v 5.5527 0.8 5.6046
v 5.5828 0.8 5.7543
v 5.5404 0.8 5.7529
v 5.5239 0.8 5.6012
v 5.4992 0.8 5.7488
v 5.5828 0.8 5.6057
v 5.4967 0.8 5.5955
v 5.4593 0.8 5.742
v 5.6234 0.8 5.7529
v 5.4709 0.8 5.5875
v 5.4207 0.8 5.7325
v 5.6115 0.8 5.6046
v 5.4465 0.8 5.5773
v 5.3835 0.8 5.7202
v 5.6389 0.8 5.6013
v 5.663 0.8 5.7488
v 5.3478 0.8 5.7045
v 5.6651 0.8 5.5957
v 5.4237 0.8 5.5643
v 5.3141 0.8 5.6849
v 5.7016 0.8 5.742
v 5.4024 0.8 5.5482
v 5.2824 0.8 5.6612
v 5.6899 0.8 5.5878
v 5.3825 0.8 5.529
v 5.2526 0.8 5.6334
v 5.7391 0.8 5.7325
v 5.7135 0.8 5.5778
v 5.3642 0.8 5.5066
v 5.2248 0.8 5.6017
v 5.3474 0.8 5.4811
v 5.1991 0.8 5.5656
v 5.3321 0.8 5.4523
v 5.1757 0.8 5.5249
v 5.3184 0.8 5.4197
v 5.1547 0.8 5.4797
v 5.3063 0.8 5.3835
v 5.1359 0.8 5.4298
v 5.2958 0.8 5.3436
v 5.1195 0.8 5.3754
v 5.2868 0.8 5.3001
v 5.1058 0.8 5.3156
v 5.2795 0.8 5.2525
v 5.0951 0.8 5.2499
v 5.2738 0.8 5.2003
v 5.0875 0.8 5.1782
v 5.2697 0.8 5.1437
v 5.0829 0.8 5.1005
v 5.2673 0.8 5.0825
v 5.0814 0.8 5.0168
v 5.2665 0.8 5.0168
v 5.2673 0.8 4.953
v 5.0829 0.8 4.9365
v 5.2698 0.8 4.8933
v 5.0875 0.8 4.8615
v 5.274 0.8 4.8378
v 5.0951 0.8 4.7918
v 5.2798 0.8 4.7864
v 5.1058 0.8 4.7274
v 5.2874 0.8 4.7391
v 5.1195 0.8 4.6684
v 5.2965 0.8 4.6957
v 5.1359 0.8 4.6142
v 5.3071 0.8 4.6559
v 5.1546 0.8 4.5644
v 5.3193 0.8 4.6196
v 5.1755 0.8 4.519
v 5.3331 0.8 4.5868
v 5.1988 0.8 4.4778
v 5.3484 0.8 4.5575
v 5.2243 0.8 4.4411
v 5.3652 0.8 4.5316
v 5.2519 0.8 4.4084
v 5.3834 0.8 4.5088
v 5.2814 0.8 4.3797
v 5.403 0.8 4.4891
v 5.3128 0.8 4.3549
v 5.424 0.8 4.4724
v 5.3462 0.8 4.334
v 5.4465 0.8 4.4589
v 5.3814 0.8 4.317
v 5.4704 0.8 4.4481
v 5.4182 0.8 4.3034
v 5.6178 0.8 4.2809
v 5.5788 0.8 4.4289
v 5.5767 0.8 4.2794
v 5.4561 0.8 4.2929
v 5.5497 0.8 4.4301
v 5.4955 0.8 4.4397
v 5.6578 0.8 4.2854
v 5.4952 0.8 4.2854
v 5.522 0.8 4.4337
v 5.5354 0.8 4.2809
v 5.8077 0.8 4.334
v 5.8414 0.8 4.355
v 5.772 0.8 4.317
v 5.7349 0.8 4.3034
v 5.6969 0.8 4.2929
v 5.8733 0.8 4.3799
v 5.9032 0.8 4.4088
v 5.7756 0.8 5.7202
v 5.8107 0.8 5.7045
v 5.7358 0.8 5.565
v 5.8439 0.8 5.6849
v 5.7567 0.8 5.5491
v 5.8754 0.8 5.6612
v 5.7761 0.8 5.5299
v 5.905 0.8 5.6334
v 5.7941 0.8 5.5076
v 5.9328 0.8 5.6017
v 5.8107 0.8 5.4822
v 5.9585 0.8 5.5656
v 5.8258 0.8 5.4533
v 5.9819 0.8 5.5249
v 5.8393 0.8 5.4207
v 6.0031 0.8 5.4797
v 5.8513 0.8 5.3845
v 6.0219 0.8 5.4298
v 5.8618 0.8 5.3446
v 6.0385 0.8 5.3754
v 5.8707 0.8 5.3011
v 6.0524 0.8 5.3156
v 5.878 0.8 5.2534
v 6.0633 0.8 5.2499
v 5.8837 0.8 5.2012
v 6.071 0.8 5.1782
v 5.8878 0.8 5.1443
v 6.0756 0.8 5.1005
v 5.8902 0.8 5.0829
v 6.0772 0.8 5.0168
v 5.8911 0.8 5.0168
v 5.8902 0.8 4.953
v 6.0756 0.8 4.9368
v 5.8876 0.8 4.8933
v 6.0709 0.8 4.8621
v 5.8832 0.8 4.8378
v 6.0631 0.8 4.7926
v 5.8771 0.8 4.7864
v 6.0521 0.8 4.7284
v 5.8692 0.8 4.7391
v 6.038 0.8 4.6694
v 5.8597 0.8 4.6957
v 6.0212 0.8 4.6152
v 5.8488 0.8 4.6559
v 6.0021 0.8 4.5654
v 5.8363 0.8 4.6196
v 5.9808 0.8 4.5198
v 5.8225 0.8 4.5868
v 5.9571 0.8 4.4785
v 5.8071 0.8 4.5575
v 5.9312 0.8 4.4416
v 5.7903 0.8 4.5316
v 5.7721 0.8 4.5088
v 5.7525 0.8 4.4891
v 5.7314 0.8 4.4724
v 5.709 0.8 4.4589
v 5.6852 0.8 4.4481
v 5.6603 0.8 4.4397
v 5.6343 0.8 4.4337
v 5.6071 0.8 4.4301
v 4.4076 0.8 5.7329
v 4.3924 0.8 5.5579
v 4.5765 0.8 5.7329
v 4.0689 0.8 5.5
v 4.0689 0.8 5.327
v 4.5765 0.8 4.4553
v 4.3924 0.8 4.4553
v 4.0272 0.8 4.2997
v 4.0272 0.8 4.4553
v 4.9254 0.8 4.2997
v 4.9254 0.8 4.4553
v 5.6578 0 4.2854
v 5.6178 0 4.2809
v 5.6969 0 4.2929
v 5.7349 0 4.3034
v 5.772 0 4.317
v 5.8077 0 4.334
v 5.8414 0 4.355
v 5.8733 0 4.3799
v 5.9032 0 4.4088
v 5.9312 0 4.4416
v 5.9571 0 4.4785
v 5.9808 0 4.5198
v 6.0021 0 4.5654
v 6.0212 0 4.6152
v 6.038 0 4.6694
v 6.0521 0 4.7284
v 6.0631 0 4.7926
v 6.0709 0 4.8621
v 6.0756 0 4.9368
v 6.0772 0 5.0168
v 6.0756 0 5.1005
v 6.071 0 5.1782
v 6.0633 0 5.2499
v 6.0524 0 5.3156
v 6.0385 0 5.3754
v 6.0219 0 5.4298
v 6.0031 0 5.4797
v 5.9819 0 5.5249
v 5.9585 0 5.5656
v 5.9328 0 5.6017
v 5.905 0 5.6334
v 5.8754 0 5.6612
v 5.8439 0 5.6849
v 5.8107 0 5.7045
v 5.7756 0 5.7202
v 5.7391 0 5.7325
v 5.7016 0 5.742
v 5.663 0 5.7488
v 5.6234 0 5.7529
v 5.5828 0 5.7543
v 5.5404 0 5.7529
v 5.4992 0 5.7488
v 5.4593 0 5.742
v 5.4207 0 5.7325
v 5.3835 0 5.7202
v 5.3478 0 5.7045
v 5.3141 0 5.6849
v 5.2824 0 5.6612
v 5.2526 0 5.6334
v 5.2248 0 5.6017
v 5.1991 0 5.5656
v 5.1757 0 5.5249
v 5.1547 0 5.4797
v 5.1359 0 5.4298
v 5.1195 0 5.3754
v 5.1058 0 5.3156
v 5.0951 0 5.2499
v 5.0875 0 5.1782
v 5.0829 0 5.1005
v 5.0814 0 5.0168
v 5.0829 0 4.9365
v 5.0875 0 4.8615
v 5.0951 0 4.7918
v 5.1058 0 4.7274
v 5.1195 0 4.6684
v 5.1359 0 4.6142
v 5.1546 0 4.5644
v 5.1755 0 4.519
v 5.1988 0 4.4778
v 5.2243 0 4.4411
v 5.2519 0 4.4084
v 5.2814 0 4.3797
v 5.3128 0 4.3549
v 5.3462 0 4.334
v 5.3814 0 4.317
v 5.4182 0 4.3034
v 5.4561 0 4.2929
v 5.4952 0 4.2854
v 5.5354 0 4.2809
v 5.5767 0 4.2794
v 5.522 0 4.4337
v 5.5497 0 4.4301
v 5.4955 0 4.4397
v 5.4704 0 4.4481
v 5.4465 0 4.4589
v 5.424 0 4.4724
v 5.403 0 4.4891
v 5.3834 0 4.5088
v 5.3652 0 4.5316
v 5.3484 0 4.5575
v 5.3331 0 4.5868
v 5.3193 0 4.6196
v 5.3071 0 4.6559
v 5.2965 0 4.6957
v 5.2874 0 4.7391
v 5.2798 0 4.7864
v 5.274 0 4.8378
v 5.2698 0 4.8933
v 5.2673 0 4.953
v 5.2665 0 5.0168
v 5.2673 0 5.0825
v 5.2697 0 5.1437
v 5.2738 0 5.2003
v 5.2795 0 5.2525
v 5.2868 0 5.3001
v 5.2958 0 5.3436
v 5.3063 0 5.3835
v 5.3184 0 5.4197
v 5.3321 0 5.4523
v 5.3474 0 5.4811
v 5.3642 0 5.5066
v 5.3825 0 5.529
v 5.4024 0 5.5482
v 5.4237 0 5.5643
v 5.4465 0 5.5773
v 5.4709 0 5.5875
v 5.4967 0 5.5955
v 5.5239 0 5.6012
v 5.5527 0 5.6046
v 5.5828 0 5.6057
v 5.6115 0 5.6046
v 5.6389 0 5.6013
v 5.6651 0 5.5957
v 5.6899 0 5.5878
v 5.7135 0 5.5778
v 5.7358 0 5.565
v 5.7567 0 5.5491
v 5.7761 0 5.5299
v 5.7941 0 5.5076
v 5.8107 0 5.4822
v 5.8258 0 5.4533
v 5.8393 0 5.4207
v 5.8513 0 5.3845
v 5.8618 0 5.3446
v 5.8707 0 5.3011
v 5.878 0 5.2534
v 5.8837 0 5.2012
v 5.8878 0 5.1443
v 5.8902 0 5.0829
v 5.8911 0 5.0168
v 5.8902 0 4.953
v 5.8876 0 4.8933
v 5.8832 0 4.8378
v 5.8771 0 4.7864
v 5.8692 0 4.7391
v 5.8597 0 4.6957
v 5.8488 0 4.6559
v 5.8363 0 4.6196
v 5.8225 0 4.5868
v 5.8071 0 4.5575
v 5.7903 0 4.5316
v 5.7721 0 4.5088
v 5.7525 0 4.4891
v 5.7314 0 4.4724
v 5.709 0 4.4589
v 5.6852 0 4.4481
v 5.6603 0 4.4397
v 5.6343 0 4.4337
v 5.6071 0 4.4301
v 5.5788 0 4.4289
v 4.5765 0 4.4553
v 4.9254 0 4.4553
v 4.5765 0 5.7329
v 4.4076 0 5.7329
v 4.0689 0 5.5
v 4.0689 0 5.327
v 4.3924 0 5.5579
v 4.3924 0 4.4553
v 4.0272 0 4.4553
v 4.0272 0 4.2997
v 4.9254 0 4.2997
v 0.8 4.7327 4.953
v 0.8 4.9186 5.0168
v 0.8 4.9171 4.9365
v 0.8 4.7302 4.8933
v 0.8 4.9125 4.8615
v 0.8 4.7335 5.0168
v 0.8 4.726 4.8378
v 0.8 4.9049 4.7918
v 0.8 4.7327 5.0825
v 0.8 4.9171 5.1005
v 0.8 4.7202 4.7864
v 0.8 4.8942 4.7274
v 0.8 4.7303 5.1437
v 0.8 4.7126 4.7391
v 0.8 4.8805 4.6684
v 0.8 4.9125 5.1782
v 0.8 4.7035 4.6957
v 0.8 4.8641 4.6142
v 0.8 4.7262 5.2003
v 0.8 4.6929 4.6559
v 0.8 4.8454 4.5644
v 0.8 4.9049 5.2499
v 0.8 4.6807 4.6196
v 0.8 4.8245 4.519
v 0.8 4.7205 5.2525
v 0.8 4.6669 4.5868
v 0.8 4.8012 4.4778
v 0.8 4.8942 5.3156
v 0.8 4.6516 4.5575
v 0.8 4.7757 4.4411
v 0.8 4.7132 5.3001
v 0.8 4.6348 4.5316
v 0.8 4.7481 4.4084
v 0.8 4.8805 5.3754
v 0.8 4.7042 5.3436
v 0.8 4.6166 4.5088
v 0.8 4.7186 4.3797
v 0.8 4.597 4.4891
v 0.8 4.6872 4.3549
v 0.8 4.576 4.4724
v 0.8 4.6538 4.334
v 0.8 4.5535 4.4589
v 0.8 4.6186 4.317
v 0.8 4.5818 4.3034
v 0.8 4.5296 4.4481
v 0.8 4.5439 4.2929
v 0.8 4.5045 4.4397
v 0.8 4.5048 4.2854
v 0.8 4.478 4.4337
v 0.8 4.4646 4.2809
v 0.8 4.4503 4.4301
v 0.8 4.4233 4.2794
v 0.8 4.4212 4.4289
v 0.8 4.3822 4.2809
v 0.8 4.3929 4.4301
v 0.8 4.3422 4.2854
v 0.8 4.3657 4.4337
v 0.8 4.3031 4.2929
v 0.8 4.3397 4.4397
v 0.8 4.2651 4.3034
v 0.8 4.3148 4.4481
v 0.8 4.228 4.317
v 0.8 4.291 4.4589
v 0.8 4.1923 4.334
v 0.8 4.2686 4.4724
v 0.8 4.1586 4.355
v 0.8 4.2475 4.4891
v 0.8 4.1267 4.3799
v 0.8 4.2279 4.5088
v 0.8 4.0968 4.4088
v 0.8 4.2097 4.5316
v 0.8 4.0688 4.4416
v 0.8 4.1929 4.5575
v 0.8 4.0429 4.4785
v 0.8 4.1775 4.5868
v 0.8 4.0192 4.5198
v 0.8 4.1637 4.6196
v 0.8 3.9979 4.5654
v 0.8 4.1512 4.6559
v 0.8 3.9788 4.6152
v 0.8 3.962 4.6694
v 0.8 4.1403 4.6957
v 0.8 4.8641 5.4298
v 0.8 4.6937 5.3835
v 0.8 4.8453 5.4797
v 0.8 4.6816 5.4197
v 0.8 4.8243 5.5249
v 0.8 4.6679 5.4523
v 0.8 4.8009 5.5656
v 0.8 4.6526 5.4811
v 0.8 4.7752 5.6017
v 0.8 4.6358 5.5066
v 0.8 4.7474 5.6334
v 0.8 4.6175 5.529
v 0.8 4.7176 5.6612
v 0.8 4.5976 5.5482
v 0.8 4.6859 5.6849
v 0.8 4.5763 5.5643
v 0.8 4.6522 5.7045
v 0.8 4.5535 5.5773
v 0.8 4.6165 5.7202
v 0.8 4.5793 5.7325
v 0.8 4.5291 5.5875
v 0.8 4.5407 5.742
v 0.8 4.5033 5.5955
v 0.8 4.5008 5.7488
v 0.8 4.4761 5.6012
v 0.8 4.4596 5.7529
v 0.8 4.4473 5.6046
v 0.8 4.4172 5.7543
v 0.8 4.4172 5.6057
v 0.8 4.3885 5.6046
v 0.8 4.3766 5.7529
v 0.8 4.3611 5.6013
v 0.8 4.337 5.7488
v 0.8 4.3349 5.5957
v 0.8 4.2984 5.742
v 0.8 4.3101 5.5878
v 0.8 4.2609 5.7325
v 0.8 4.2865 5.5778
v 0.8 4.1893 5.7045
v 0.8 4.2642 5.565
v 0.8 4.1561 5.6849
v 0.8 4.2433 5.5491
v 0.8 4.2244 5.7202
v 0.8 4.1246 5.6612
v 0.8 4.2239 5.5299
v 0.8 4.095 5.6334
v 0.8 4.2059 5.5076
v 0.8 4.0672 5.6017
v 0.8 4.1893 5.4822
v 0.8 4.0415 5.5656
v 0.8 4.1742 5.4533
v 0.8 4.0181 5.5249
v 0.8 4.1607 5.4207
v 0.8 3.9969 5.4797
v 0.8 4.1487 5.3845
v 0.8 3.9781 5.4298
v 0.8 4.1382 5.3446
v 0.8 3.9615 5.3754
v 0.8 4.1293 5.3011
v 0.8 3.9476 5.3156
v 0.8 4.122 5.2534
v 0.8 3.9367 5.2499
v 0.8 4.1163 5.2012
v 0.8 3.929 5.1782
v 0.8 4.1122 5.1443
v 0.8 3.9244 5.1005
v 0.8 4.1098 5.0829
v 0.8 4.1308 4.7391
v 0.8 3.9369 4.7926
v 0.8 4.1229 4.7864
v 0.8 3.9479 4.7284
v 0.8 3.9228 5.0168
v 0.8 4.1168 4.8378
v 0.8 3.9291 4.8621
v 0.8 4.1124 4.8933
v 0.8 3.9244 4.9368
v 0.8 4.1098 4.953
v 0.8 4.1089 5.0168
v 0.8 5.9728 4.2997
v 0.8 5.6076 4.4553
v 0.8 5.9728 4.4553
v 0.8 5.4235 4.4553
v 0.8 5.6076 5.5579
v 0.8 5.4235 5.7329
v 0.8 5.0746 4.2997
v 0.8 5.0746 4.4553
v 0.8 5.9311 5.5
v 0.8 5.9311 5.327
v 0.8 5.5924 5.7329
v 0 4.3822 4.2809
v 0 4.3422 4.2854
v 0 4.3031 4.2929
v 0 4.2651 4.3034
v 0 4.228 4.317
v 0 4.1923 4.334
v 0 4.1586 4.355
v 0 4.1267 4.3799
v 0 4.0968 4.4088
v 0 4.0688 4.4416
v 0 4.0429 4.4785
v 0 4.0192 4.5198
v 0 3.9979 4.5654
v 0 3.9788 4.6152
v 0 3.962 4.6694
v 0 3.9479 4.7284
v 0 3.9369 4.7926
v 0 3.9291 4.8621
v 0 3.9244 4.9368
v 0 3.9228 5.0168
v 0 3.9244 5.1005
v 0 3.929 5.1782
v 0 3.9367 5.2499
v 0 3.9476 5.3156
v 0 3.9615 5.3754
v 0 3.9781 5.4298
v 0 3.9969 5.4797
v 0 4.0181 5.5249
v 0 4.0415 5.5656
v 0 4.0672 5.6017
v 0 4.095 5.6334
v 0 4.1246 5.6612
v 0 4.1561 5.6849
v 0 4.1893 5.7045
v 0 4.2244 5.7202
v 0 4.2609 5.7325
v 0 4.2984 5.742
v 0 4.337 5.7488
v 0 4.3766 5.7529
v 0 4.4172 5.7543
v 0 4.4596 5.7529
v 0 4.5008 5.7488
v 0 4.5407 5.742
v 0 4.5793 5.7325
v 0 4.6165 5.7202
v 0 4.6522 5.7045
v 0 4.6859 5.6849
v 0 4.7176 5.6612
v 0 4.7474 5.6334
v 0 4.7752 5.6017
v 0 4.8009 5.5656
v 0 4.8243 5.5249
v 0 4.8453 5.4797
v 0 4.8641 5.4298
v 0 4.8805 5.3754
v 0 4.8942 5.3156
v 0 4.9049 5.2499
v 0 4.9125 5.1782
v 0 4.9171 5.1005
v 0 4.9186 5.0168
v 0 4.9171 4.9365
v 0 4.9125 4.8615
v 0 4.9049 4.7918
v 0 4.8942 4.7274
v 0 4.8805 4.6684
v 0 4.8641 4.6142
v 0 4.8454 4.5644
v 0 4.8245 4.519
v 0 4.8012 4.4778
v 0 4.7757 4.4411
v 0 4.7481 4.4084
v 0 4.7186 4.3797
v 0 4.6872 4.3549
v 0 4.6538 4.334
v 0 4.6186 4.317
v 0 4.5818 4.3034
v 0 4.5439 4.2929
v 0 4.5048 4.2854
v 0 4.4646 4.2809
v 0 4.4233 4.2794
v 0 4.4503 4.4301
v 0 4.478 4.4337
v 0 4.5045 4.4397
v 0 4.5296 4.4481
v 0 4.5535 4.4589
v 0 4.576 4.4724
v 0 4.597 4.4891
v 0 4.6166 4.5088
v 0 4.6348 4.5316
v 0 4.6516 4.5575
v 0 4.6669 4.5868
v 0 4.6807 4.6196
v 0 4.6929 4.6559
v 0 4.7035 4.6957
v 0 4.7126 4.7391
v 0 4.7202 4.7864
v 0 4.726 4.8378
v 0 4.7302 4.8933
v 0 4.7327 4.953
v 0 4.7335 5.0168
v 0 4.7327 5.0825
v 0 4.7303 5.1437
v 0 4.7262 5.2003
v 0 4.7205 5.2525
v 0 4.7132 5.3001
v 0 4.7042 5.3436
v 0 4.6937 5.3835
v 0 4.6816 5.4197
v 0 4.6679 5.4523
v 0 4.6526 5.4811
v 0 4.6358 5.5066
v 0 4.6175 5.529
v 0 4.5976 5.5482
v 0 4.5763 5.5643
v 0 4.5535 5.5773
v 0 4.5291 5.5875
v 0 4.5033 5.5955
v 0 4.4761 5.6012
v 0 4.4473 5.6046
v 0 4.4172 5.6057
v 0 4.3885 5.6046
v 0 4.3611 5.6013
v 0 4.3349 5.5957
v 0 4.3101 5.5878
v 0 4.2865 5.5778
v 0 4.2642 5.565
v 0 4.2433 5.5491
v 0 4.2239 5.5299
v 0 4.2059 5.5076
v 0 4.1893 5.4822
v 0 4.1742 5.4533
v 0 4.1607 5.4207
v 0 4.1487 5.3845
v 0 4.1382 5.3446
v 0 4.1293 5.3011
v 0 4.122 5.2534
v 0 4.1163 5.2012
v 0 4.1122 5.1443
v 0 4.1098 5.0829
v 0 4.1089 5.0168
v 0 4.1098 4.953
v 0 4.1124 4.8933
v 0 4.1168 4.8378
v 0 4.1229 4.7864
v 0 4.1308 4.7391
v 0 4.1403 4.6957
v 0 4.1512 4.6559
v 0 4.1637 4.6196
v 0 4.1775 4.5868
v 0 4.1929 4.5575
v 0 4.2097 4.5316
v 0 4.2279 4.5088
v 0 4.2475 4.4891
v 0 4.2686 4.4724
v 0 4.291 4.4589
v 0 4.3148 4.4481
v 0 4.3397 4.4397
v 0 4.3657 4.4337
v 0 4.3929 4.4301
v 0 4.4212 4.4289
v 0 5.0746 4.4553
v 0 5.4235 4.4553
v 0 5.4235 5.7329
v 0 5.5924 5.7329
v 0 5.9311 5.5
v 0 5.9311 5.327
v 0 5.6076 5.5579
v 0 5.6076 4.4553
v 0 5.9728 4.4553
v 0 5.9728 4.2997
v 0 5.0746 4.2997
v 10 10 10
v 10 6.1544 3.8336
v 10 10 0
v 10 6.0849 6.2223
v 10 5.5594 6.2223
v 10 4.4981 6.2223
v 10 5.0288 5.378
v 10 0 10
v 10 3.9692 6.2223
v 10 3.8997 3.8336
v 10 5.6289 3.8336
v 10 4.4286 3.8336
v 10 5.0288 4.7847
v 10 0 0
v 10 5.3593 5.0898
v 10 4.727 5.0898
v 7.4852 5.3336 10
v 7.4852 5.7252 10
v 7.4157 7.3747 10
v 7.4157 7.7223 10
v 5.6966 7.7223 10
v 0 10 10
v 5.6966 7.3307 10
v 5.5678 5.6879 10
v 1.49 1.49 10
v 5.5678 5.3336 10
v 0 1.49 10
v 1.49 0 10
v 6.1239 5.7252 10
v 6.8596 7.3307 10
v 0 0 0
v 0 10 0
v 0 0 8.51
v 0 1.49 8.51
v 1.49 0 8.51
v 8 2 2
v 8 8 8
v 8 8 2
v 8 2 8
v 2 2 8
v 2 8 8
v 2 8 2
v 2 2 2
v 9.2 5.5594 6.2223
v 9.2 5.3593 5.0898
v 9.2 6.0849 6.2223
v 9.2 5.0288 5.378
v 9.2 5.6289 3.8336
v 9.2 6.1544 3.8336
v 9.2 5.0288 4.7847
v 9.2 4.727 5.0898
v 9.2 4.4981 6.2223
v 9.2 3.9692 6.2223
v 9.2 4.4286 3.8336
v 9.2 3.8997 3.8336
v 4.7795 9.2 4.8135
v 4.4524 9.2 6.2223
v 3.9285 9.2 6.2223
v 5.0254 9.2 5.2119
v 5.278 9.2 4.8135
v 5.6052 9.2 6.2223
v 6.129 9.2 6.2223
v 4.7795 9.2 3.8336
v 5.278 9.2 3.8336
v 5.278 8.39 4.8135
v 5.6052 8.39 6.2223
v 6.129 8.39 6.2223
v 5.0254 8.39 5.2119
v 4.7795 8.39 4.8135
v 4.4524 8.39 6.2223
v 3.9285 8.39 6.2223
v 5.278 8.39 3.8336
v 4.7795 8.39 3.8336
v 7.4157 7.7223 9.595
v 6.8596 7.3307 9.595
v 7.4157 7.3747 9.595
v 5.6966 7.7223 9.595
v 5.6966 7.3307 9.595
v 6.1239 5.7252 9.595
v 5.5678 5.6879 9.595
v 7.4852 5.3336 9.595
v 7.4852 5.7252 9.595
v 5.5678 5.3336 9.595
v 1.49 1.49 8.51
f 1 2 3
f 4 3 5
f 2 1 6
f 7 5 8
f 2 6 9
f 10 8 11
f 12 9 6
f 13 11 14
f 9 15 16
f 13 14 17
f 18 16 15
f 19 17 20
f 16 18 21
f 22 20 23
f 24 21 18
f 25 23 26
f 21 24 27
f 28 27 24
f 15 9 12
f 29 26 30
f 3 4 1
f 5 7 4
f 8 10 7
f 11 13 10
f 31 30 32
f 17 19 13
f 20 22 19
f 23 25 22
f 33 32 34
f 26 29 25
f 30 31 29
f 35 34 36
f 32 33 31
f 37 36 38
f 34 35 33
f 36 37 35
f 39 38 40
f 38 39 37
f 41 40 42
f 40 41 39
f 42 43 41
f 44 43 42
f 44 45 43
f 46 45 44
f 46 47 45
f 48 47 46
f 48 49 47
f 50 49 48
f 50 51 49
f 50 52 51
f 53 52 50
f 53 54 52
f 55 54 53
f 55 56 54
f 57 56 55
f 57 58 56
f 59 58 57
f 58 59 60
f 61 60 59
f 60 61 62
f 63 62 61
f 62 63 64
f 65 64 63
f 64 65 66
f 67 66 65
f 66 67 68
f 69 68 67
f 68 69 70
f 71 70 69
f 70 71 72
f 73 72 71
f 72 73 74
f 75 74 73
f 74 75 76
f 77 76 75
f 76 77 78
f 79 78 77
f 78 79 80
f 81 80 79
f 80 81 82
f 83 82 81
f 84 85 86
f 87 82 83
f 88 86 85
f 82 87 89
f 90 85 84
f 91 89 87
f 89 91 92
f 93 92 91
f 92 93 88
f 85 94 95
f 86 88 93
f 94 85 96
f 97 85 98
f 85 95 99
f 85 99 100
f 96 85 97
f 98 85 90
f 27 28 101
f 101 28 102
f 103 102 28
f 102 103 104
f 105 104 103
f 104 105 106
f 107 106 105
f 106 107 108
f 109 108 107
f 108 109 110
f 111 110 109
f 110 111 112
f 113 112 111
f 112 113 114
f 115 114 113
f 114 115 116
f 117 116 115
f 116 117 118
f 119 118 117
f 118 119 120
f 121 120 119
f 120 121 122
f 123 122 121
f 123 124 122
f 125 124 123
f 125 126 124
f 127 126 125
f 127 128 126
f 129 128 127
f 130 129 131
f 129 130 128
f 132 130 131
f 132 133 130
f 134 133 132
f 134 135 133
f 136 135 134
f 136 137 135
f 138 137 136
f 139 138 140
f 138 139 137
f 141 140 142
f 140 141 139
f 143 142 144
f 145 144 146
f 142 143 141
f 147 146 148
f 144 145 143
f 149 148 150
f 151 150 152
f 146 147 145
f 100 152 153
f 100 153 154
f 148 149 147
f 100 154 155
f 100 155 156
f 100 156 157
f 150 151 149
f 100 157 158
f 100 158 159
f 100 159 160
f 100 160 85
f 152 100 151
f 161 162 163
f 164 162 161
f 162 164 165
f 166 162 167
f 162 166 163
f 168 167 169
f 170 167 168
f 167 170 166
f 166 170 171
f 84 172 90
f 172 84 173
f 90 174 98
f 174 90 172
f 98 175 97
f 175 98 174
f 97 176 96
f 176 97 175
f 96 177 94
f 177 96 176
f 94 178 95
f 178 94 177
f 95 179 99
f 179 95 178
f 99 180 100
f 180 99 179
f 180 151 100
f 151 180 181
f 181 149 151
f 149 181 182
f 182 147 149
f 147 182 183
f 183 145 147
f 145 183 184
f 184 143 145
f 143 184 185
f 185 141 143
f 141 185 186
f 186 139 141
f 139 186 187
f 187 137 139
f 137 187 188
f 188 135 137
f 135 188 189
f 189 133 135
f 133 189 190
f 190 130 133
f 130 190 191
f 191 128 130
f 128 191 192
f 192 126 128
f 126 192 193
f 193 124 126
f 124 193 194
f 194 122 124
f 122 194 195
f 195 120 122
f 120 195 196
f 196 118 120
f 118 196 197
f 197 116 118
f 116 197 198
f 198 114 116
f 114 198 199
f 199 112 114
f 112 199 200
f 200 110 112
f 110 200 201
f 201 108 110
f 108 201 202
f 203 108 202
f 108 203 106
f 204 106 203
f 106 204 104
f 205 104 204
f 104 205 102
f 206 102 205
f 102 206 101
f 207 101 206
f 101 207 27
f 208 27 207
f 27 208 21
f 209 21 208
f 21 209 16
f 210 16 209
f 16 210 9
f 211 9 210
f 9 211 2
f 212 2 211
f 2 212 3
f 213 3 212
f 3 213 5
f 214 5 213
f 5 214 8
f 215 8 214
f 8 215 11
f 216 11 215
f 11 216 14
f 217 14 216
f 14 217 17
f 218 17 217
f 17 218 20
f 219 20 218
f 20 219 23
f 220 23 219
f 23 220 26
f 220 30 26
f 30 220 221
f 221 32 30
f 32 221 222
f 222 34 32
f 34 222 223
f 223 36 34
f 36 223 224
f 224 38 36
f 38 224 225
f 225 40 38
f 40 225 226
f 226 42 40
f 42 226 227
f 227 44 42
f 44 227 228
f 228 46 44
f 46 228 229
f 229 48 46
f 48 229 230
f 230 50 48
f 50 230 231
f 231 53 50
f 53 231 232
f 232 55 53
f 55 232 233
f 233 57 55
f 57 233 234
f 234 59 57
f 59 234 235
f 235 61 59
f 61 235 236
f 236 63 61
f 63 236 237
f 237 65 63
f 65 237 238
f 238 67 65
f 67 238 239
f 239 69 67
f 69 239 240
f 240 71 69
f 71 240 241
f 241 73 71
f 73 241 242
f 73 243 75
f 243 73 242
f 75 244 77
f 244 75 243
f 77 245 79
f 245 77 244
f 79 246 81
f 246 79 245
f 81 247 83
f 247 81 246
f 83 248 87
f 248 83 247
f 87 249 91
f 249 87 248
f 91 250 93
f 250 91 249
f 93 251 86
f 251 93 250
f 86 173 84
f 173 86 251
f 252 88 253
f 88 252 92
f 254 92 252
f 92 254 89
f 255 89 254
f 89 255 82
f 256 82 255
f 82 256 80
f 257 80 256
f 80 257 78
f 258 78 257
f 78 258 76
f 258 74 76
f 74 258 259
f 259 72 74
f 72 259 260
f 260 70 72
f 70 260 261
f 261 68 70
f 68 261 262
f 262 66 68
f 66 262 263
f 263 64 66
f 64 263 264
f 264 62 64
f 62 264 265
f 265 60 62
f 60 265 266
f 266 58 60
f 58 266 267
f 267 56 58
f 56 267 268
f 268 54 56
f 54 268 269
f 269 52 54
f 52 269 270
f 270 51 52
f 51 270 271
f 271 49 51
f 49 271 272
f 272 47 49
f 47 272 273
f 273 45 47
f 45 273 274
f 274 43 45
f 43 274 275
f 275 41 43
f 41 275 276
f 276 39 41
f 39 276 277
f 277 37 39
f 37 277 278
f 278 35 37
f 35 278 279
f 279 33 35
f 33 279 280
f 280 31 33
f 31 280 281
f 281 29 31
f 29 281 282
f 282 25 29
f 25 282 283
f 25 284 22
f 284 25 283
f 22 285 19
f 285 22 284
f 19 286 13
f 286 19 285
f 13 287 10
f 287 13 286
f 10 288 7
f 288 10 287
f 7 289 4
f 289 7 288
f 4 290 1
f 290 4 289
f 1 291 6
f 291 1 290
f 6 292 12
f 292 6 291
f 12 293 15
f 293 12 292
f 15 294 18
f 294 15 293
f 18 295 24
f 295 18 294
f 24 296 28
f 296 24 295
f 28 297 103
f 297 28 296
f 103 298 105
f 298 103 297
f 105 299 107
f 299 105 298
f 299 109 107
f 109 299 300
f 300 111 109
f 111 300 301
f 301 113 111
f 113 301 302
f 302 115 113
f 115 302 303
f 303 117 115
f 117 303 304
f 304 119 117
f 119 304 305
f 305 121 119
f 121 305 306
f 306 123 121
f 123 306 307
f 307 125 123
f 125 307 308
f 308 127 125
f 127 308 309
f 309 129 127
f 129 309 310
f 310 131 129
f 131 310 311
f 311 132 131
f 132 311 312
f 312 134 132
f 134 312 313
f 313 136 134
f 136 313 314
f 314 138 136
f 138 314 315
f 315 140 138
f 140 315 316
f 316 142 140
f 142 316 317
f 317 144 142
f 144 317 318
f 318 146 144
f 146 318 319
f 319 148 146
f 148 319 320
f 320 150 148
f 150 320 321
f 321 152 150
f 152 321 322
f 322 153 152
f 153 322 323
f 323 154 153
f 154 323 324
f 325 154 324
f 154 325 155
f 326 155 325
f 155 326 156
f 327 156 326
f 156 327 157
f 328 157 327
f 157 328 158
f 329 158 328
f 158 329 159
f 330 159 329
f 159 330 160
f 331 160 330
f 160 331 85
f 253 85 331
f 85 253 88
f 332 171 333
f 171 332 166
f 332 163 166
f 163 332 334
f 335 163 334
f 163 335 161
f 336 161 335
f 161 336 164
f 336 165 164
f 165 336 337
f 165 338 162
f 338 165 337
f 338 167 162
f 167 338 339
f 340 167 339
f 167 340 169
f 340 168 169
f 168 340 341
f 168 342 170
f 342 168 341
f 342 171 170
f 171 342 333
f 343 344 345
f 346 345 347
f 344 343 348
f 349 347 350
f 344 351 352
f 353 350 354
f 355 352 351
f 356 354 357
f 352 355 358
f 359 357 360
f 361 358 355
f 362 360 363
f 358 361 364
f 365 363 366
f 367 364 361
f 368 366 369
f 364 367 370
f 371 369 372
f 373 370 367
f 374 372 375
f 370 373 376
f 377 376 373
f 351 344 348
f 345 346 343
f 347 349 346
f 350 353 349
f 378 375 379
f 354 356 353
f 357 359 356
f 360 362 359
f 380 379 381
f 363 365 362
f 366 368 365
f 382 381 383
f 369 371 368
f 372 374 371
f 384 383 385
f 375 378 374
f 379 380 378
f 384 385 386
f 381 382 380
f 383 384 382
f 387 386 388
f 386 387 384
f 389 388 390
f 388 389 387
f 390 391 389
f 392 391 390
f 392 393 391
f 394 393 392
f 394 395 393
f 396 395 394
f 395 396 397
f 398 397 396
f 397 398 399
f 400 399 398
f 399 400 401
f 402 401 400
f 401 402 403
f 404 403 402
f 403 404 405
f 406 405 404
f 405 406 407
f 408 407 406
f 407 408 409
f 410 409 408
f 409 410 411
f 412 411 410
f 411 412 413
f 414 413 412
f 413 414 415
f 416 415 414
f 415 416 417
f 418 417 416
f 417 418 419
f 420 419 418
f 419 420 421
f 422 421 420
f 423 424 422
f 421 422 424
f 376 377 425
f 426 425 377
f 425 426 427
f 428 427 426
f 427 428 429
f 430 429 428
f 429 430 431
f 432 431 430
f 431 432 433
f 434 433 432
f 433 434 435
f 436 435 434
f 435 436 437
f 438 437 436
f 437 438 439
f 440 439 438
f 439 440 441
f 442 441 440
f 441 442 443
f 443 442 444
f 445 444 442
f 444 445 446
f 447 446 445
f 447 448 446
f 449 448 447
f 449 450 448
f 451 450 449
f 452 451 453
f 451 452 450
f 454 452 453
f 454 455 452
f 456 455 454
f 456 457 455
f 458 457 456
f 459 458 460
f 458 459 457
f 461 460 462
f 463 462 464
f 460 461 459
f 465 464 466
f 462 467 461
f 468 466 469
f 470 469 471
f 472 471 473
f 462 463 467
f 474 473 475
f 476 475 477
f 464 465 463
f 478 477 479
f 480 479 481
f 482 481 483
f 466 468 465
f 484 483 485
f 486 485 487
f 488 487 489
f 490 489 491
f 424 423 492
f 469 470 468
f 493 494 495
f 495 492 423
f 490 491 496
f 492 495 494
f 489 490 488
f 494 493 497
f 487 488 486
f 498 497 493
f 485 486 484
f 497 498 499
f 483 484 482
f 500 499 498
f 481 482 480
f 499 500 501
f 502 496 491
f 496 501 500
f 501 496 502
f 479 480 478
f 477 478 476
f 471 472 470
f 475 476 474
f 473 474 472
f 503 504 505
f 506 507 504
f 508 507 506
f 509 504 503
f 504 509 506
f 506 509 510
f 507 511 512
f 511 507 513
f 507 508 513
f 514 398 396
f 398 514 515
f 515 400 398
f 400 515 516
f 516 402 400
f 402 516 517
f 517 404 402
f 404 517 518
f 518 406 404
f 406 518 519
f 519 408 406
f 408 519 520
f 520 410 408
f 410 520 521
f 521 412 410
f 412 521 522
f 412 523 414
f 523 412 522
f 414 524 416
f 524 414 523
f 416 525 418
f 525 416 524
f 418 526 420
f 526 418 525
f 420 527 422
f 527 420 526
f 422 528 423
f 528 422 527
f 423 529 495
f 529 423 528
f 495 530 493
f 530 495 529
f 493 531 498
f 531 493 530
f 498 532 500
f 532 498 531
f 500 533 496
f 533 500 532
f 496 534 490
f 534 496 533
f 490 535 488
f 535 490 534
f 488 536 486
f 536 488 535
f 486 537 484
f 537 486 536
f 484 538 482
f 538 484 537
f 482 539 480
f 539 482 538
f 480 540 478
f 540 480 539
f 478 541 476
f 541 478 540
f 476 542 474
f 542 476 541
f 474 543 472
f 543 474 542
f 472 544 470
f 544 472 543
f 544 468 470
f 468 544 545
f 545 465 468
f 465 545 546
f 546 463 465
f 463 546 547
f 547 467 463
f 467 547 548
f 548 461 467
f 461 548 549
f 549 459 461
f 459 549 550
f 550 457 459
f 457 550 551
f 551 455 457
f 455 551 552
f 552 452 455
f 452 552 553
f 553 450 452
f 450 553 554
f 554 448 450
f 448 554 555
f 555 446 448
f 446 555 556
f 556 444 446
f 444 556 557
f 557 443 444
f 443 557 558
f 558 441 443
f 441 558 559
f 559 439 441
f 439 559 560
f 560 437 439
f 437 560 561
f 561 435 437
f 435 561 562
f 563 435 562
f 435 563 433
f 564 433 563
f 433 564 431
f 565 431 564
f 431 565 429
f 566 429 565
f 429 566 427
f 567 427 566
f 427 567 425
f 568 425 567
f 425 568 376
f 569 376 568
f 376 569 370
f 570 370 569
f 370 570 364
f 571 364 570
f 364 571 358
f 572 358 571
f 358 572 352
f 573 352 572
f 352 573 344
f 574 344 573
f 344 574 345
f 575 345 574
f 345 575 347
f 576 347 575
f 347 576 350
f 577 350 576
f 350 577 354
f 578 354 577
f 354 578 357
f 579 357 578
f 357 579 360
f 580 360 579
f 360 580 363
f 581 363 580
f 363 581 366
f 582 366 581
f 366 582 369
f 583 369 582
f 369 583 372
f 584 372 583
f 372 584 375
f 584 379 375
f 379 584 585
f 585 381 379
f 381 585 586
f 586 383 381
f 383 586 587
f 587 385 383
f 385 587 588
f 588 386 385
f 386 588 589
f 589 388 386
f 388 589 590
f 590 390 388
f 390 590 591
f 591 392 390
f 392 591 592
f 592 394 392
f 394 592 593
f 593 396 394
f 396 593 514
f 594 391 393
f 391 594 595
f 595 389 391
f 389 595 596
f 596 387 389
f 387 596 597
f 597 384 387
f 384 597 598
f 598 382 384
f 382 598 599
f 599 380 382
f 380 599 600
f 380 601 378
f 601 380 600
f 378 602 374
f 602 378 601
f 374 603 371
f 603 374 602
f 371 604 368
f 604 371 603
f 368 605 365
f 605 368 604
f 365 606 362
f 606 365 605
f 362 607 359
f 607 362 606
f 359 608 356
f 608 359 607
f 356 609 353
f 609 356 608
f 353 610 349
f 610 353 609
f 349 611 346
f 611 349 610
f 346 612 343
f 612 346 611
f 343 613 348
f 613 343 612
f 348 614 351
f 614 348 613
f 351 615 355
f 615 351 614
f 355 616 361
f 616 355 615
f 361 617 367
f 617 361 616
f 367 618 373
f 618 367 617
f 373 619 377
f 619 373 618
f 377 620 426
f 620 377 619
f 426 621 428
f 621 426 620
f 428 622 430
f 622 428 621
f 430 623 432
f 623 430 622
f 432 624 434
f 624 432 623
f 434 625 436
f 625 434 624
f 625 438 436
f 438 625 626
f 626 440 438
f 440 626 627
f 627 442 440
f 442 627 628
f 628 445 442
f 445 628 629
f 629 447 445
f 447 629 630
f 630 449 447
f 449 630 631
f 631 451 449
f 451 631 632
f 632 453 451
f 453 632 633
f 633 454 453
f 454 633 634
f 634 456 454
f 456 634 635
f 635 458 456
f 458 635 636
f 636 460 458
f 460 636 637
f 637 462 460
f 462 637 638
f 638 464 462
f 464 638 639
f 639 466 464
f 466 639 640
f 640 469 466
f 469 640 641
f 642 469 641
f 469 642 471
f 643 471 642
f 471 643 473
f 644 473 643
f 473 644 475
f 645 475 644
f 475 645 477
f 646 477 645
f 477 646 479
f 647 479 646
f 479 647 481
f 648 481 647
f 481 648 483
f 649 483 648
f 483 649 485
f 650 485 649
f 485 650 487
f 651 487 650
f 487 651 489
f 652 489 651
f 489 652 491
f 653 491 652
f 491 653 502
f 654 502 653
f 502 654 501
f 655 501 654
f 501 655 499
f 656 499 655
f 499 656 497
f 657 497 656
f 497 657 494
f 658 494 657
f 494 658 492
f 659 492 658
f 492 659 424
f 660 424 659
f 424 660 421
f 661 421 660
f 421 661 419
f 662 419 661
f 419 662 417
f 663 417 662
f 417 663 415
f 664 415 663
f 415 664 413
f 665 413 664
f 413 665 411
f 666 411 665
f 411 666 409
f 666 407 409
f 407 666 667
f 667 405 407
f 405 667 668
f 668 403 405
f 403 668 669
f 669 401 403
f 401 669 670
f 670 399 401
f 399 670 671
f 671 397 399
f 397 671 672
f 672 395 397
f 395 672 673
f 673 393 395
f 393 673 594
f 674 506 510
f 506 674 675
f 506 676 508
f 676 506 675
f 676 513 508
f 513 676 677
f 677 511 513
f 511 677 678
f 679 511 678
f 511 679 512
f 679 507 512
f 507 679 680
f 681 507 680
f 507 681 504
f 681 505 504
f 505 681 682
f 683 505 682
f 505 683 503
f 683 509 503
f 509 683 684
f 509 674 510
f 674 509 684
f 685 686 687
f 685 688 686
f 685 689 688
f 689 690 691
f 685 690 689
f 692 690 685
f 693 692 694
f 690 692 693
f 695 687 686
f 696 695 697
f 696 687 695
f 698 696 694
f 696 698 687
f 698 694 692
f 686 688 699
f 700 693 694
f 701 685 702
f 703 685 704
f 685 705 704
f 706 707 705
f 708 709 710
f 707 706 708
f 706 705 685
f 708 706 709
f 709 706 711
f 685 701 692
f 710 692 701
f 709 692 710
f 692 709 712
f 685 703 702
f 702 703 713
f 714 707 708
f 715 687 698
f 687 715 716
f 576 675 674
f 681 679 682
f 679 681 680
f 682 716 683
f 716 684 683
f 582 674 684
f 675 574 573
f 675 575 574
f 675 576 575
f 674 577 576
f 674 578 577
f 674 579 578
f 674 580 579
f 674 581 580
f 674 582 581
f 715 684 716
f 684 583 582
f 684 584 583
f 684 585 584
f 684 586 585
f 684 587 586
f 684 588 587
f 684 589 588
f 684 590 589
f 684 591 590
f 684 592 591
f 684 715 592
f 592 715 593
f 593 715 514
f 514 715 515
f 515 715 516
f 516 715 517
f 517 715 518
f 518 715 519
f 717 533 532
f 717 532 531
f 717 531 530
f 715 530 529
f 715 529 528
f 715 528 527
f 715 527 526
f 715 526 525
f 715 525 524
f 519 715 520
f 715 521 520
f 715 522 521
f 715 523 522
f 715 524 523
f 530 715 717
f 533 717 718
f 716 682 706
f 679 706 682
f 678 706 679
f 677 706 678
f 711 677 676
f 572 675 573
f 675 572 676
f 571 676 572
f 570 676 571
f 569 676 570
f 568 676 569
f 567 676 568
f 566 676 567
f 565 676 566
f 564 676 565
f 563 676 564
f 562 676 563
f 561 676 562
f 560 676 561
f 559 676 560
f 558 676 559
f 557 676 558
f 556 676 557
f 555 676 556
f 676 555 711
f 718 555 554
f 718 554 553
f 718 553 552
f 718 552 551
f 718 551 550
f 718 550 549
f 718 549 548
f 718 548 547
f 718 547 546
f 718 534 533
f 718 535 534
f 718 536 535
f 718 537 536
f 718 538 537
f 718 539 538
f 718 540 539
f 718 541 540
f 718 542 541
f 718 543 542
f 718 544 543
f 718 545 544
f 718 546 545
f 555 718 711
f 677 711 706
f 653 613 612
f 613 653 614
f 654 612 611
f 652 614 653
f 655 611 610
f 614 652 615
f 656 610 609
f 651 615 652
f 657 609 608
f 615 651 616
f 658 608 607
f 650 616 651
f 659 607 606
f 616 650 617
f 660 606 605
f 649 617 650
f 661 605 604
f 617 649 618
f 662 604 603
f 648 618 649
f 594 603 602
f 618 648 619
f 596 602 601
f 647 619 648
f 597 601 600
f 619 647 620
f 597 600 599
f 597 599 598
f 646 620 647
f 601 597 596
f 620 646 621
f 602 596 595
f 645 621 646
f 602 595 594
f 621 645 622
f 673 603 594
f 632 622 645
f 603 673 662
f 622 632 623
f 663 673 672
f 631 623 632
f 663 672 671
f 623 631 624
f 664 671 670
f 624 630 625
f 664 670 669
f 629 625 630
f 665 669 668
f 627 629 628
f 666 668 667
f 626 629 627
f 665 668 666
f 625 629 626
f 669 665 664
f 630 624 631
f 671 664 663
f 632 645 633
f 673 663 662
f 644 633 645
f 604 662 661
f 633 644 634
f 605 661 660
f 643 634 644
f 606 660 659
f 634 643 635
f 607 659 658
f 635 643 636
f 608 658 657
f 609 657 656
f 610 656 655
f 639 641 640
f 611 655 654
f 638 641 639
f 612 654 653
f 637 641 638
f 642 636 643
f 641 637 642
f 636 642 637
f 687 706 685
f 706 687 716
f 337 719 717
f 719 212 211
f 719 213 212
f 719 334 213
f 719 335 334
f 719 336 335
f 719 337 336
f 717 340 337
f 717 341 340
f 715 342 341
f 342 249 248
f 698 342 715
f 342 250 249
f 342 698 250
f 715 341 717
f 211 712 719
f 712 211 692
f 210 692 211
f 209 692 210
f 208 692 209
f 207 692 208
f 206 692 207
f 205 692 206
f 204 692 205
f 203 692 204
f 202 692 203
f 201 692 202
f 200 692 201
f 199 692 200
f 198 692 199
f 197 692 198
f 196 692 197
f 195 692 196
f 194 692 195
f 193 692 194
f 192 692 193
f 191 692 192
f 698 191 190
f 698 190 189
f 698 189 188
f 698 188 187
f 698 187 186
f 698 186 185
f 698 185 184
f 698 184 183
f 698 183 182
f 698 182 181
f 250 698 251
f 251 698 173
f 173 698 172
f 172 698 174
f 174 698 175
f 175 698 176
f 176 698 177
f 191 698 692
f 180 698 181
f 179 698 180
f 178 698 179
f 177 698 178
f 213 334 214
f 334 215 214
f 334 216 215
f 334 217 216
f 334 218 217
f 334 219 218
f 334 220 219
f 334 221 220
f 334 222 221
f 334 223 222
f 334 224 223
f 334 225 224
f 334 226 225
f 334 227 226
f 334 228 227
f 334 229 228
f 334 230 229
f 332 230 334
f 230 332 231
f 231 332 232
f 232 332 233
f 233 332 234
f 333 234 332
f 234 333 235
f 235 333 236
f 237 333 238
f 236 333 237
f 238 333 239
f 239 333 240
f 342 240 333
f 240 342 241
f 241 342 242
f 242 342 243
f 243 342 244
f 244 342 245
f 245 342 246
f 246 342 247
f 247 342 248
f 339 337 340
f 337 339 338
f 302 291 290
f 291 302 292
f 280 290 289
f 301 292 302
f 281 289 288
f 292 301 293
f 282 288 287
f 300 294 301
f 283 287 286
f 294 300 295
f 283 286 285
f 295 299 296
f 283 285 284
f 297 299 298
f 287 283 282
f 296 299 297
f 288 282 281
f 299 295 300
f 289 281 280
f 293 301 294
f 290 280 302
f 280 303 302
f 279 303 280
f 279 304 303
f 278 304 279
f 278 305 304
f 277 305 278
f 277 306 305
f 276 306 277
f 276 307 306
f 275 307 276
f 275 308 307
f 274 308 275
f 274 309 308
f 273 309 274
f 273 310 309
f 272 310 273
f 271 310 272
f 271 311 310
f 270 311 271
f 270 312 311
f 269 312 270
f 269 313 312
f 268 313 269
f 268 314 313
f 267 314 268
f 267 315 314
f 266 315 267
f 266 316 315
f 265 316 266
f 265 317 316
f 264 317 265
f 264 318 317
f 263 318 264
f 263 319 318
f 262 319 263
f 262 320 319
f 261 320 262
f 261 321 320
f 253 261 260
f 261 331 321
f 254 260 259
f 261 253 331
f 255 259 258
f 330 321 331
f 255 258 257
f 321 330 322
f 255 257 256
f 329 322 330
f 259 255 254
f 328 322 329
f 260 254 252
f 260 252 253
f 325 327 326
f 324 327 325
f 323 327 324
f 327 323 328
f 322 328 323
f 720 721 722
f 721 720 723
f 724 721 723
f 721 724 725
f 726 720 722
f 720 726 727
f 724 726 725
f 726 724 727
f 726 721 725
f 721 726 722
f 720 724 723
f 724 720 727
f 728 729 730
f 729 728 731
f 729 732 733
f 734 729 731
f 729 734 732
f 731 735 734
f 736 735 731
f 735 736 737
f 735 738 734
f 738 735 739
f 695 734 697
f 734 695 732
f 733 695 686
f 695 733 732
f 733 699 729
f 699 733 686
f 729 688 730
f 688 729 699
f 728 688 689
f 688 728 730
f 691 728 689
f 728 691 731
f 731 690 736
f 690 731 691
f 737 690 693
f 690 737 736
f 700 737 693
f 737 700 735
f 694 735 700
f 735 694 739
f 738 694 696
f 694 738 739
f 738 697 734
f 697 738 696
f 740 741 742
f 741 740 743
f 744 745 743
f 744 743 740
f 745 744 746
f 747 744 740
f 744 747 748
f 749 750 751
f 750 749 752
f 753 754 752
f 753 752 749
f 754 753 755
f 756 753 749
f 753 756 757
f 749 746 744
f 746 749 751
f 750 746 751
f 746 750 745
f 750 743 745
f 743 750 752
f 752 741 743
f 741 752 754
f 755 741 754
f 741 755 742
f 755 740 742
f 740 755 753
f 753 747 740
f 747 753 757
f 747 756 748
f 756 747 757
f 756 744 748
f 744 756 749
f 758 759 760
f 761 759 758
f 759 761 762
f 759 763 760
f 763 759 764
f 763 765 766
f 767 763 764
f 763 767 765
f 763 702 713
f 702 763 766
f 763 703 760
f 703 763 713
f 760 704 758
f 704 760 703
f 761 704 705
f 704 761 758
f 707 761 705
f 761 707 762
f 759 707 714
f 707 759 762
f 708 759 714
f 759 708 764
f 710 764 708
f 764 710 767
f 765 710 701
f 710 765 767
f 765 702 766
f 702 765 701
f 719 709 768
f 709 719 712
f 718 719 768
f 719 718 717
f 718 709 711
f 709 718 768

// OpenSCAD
// Calibration Cube - Test shape with axis indicators and dimension markers
// Use this to verify printer calibration and understand coordinate system
//
// Face layout:
//   +X (right):  "X" label
//   -X (left):   dimension value
//   +Y (back):   "Y" label  
//   -Y (front):  dimension value
//   +Z (top):    "Z" label + notch
//   -Z (bottom): flat (print surface)
//
// Parameters:
//   size - Cube dimension (default: 20mm)
//   show_axes - Include XYZ axis indicators for preview only (default: true)
//   show_dimensions - Include dimension markers (default: true)
//   wall_thickness - Shell thickness (default: 2mm)

// Customizer parameters
size = 10;              // [10:1:50] Cube size in mm
show_axes = true;       // Show axis indicators (preview only, not in STL)
show_dimensions = true; // Show dimension markers
wall_thickness = 2;     // [1:0.5:5] Wall thickness

/* [Hidden] */
$fn = 32;
axis_length = size * 0.8;
axis_radius = size * 0.03;
arrow_size = size * 0.1;
font_size = size * 0.15;
label_font_size = size * 0.25;
marker_depth = 0.8;
notch_size = size * 0.15;

// Main calibration cube
module calibration_cube() {
    difference() {
        // Outer cube
        cube([size, size, size]);
        
        // Hollow interior (optional for faster printing)
        if (wall_thickness < size/2) {
            translate([wall_thickness, wall_thickness, wall_thickness])
            cube([size - 2*wall_thickness, size - 2*wall_thickness, size - 2*wall_thickness]);
        }
        
        // Dimension markers - on -X (left) and -Y (front) faces
        if (show_dimensions) {
            // Dimension on -Y face (front, facing you)
            translate([size/2, marker_depth, size/2])
            rotate([90, 0, 0])
            linear_extrude(marker_depth + 0.01)
            text(str(size), size=font_size, halign="center", valign="center");
            
            // Dimension on -X face (left side)
            translate([marker_depth, size/2, size/2])
            rotate([90, 0, -90])
            linear_extrude(marker_depth + 0.01)
            text(str(size), size=font_size, halign="center", valign="center");
        }
        
        // Axis labels - on +X, +Y, +Z faces (opposite from dimensions)
        // X label on +X face (right side)
        translate([size - marker_depth, size/2, size/2])
        rotate([90, 0, 90])
        linear_extrude(marker_depth + 0.01)
        text("X", size=label_font_size, halign="center", valign="center", font="Liberation Sans:style=Bold");
        
        // Y label on +Y face (back side)
        translate([size/2, size - marker_depth, size/2])
        rotate([90, 0, 0])
        linear_extrude(marker_depth + 0.01)
        text("Y", size=label_font_size, halign="center", valign="center", font="Liberation Sans:style=Bold");
        
        // Z label on +Z face (top) - offset from center for notch
        translate([size * 0.65, size * 0.65, size])
        linear_extrude(marker_depth + 0.01, center=true)
        text("Z", size=label_font_size, halign="center", valign="center", font="Liberation Sans:style=Bold");
        
        // Corner notch on TOP at origin corner (0,0,size)
        translate([-0.01, -0.01, size - notch_size + 0.01])
        cube([notch_size, notch_size, notch_size + 0.01]);
    }
}

// Axis indicator arrow (preview only)
module axis_arrow(length, color_name) {
    color(color_name) {
        // Shaft
        cylinder(h=length - arrow_size, r=axis_radius);
        // Arrow head
        translate([0, 0, length - arrow_size])
        cylinder(h=arrow_size, r1=arrow_size/2, r2=0);
    }
}

// XYZ axes at origin (preview only - uses % for ghost rendering)
module axes() {
    // X axis - Red
    rotate([0, 90, 0])
    axis_arrow(axis_length, "red");
    
    // Y axis - Green
    rotate([-90, 0, 0])
    axis_arrow(axis_length, "green");
    
    // Z axis - Blue
    axis_arrow(axis_length, "blue");
}

// Origin marker (corner sphere, preview only)
module origin_marker() {
    color("white")
    sphere(r=axis_radius * 2);
}

// Render the printable cube
color("gray", 0.8)
calibration_cube();

// Axes are preview-only (% modifier makes them not render to STL)
if (show_axes) {
    % origin_marker();
    % axes();
}
